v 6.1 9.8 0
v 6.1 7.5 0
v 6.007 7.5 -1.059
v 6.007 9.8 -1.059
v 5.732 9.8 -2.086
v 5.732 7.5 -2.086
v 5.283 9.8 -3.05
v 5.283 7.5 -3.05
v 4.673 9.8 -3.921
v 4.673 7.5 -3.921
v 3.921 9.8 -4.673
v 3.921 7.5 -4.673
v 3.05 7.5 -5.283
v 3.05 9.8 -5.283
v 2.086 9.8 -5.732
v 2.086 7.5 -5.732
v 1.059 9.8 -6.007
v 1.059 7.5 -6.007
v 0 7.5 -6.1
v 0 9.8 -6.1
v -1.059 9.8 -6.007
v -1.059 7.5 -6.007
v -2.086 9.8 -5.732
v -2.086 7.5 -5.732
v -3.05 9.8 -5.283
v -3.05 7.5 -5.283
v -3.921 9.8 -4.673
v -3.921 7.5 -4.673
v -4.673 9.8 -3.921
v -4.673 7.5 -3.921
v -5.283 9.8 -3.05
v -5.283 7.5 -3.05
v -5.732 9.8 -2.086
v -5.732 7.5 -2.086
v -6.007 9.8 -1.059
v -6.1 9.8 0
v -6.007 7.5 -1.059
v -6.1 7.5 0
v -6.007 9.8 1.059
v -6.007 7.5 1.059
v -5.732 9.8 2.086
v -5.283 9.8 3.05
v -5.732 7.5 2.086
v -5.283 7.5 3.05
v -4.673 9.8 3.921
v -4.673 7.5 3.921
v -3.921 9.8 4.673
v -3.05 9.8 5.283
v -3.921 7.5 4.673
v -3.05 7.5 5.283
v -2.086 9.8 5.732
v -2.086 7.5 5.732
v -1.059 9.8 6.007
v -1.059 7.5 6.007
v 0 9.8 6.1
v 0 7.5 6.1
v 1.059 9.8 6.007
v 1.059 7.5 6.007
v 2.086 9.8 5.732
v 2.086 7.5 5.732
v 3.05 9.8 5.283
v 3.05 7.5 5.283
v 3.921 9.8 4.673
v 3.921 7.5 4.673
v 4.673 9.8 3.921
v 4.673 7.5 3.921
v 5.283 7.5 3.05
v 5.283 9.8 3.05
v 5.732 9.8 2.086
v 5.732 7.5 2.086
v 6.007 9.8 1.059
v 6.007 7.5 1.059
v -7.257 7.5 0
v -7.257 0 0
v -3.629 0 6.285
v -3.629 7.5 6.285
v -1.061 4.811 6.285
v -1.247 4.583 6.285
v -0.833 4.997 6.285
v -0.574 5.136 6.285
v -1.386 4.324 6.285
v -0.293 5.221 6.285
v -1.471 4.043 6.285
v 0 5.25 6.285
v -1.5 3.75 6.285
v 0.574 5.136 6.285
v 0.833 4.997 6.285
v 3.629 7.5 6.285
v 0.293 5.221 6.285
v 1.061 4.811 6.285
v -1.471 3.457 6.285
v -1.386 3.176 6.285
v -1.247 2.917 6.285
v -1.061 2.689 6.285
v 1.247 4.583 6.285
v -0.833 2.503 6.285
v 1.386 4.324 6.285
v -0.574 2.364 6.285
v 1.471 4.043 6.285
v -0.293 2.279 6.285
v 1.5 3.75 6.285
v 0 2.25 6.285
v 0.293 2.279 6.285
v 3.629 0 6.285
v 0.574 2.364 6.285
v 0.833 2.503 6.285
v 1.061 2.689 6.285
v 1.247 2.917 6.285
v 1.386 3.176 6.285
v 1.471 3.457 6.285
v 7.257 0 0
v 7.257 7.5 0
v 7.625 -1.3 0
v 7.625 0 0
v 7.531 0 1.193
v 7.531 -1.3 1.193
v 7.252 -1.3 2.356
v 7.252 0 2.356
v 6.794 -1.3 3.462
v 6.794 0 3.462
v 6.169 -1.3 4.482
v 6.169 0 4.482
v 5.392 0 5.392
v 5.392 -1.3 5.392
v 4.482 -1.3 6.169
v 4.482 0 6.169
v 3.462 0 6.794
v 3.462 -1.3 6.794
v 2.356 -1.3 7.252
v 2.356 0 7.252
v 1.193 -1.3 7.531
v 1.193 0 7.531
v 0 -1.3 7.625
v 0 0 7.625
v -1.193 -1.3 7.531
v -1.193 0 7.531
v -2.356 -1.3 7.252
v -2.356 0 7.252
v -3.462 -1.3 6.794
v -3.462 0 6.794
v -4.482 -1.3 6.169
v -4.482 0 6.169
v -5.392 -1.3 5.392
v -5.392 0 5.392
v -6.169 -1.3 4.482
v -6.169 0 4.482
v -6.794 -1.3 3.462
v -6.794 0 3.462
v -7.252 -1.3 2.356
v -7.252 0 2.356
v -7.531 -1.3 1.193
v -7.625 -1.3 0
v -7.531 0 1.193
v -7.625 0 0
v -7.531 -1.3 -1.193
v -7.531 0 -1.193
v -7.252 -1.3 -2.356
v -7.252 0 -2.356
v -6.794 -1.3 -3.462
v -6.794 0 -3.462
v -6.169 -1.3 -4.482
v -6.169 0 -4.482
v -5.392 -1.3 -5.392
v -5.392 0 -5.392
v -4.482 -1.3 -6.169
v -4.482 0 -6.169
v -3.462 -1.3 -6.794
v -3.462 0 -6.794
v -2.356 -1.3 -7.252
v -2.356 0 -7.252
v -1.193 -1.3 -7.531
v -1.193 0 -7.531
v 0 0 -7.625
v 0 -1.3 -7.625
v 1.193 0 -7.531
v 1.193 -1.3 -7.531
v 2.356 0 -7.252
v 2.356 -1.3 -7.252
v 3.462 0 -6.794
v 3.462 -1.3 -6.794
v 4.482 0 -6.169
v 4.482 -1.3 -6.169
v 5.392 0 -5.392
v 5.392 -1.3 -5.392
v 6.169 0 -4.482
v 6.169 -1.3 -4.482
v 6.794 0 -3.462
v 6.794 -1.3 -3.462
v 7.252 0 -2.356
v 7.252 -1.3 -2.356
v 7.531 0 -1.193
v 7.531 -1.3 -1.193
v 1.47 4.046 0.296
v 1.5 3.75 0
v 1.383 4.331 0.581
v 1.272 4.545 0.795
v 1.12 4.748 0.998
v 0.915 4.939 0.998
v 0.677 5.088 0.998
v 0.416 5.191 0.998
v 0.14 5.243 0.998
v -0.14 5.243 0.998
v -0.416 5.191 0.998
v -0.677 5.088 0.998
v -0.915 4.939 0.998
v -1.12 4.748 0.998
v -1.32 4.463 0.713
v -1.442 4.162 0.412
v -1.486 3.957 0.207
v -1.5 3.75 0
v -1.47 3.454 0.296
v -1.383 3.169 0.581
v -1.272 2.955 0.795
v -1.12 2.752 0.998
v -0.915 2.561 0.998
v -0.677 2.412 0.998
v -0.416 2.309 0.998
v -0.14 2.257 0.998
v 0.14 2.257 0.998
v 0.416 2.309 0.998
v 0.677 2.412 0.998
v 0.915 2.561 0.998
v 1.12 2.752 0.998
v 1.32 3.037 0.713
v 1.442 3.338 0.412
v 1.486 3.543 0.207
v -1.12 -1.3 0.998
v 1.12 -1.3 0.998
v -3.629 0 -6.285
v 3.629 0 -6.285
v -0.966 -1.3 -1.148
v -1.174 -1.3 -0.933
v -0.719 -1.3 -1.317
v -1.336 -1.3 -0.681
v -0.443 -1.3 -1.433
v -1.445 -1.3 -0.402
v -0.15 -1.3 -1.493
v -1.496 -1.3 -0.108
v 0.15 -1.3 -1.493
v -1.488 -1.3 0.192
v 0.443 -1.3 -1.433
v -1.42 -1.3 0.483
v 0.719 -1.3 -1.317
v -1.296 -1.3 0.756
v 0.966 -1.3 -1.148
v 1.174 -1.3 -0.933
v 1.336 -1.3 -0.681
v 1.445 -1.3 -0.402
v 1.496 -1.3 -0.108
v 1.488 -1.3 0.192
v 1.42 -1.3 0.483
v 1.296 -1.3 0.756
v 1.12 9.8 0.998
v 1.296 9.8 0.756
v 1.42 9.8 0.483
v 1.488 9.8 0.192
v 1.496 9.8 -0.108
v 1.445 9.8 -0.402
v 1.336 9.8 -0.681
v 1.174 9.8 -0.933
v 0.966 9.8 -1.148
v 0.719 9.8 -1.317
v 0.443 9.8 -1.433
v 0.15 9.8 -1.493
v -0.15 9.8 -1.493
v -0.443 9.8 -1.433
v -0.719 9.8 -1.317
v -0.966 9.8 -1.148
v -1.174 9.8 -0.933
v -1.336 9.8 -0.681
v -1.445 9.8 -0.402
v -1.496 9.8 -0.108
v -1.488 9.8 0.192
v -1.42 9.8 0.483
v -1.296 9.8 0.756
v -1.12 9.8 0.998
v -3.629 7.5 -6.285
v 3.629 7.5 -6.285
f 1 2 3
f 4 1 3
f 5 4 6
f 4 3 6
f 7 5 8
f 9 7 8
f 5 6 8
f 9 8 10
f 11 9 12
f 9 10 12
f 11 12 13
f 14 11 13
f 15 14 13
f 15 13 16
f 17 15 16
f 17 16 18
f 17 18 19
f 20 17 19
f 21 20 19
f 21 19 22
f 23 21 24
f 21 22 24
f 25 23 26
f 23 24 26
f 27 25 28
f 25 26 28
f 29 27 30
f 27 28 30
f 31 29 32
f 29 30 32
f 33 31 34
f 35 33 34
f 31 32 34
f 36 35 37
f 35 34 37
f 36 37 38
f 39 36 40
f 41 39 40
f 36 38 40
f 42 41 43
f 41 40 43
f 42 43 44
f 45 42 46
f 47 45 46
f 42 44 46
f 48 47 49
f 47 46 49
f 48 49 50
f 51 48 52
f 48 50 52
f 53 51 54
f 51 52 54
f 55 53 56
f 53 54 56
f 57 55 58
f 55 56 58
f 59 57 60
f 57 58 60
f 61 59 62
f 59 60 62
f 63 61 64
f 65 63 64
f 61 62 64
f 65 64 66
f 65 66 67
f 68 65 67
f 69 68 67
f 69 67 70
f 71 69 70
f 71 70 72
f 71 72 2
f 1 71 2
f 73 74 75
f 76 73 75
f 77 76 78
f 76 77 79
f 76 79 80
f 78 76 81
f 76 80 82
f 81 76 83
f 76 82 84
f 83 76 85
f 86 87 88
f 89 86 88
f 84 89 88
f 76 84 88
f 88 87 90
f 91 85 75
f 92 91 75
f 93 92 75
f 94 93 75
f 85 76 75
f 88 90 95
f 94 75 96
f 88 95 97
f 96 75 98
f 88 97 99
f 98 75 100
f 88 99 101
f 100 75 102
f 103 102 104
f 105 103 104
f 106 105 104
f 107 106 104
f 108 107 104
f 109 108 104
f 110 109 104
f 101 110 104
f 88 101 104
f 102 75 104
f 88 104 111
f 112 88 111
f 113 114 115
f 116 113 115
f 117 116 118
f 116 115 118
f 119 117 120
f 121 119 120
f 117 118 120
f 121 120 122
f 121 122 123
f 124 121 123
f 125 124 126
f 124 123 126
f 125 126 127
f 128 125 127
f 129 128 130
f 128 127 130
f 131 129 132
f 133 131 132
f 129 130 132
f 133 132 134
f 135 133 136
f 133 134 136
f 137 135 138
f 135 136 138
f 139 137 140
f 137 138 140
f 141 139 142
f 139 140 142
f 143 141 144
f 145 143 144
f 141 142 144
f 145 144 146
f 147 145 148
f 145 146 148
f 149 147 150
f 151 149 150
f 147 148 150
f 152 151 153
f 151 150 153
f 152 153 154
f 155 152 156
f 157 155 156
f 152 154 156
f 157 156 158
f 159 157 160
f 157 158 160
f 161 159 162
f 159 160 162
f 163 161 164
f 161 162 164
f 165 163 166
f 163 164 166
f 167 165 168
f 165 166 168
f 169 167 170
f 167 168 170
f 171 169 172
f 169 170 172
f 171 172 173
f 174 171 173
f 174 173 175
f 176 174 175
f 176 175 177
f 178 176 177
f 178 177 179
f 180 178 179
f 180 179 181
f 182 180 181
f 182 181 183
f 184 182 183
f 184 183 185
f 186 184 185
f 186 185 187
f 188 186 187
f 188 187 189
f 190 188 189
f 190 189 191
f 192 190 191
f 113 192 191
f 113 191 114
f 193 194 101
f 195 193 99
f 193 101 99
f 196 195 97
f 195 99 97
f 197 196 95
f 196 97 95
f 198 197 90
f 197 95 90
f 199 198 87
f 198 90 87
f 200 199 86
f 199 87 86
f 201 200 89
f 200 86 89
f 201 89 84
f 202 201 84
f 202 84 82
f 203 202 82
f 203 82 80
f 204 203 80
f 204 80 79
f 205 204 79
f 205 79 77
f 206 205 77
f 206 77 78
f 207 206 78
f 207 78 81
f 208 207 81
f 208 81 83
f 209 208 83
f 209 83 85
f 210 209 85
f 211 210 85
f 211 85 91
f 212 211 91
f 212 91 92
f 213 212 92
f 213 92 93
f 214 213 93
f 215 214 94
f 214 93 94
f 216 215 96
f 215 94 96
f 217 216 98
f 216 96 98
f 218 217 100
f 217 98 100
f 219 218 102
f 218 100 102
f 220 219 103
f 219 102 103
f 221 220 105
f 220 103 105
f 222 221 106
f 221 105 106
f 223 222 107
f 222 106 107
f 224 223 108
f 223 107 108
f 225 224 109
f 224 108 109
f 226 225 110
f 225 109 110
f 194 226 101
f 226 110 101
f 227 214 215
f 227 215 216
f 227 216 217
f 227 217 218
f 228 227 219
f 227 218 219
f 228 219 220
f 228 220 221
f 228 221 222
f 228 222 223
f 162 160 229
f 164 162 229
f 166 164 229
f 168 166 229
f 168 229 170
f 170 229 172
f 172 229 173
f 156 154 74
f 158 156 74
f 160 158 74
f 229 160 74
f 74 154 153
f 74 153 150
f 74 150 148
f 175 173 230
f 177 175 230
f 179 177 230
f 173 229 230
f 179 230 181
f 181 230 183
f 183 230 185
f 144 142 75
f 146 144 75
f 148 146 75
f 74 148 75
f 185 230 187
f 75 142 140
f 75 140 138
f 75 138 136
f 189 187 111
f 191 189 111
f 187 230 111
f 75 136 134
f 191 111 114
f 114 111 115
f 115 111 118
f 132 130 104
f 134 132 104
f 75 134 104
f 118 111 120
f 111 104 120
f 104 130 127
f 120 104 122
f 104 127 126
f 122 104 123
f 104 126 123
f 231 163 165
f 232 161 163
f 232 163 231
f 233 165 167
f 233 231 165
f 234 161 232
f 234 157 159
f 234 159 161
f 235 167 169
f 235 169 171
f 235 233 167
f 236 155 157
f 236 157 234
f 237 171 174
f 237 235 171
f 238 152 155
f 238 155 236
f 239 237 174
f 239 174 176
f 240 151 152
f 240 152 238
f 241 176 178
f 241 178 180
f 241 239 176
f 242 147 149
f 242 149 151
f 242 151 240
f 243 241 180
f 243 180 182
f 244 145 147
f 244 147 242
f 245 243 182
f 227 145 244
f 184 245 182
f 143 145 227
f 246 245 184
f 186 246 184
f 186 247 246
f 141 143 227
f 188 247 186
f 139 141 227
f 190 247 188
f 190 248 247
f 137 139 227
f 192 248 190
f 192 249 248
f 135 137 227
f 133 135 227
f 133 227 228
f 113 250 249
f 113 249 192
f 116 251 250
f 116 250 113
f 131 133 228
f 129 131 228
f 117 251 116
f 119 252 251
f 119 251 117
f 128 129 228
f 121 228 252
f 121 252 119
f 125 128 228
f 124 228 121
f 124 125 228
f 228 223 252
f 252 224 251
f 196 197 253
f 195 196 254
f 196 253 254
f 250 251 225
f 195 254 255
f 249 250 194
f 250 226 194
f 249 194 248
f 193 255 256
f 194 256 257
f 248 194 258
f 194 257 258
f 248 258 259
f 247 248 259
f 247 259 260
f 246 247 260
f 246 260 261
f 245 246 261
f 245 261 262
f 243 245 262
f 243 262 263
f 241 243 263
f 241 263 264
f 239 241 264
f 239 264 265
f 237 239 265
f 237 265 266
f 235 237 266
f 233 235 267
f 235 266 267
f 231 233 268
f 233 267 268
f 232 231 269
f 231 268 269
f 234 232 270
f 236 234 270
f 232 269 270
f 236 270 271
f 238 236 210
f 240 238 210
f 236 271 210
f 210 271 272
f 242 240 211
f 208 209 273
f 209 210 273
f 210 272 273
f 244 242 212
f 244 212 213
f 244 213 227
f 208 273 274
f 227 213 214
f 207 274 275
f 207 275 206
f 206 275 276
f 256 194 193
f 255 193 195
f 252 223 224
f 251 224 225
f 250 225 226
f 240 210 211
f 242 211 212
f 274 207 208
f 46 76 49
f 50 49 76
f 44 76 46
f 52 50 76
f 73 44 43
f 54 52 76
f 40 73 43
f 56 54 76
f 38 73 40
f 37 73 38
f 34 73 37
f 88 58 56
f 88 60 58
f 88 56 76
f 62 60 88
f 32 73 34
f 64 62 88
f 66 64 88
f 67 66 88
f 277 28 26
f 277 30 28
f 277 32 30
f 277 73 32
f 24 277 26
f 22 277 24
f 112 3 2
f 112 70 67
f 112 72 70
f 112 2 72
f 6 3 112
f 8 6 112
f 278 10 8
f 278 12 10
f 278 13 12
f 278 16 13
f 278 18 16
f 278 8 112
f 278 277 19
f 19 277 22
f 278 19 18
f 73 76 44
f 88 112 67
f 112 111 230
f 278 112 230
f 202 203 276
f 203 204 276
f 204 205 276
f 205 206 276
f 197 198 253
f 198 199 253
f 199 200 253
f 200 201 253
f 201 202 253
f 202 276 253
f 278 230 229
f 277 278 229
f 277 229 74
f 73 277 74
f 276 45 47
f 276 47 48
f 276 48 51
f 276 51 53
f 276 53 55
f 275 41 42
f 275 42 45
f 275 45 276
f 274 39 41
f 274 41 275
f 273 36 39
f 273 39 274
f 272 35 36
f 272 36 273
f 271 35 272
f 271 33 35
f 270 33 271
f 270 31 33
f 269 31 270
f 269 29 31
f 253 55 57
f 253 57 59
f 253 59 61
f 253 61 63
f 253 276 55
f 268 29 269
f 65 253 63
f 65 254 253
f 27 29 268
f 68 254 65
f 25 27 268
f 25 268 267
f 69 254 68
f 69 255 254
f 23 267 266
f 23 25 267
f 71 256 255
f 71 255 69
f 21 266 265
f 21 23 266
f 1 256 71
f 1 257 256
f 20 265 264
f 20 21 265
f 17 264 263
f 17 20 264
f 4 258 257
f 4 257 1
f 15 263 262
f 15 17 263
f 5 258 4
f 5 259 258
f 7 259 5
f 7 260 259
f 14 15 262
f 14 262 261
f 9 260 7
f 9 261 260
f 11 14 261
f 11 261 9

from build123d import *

# Parameters (mm, degrees)
BOSS_EXTRUDE1_DEPTH = 7.5
SKETCH2_R           = 6.1
BOSS_EXTRUDE2_DEPTH = 2.3
SKETCH3_R           = 7.625
BOSS_EXTRUDE3_DEPTH = 1.3
CUT_EXTRUDE1_DEPTH  = 12.1
CUT_EXTRUDE2_REACH  = 15.91
SKETCH5_R           = 1.5


with BuildPart() as part:
    # Sketch1 → Boss-Extrude1 (new body)
    with BuildSketch(Plane(origin=(0, 0, 0), x_dir=(1, 0, 0), z_dir=(0, 1, 0))):
        Polygon((7.257292884, 0), (3.628646442, 6.285), (-3.628646442, 6.285), (-7.257292884, 0), (-3.628646442, -6.285), (3.628646442, -6.285), align=None)
    extrude(amount=BOSS_EXTRUDE1_DEPTH)

    # Sketch2 → Boss-Extrude2 (add)
    with BuildSketch(Plane(origin=(0, 7.5, 0), x_dir=(1, 0, 0), z_dir=(0, 1, 0))):
        Circle(SKETCH2_R)
    extrude(amount=BOSS_EXTRUDE2_DEPTH)

    # Sketch3 → Boss-Extrude3 (add)
    with BuildSketch(Plane.XZ):
        Circle(SKETCH3_R)
    extrude(amount=BOSS_EXTRUDE3_DEPTH)

    # Sketch4 → Cut-Extrude1 (cut, through all)
    with BuildSketch(Plane(origin=(0, 9.8, 0), x_dir=(1, 0, 0), z_dir=(0, 1, 0))):
        with BuildLine():
            Line((-1.12, -0.997797575), (1.12, -0.997797575))
            ThreePointArc((1.12, -0.997797575), (0, 1.5), (-1.12, -0.997797575))
        make_face()
    extrude(amount=-CUT_EXTRUDE1_DEPTH, mode=Mode.SUBTRACT)

    # Sketch5 → Cut-Extrude2 (cut, up to next)
    with BuildSketch(Plane.XY.offset(6.285), mode=Mode.PRIVATE) as cut_extrude2_sk1:
        with Locations((0, 3.75)):
            Circle(SKETCH5_R)
    cut_extrude2_tool1 = extrude(cut_extrude2_sk1.sketch, amount=-CUT_EXTRUDE2_REACH, mode=Mode.PRIVATE) & part.part
    add(cut_extrude2_tool1.solids().sort_by_distance((0, 3.75, 6.285))[0], mode=Mode.SUBTRACT)


solid = part.part
